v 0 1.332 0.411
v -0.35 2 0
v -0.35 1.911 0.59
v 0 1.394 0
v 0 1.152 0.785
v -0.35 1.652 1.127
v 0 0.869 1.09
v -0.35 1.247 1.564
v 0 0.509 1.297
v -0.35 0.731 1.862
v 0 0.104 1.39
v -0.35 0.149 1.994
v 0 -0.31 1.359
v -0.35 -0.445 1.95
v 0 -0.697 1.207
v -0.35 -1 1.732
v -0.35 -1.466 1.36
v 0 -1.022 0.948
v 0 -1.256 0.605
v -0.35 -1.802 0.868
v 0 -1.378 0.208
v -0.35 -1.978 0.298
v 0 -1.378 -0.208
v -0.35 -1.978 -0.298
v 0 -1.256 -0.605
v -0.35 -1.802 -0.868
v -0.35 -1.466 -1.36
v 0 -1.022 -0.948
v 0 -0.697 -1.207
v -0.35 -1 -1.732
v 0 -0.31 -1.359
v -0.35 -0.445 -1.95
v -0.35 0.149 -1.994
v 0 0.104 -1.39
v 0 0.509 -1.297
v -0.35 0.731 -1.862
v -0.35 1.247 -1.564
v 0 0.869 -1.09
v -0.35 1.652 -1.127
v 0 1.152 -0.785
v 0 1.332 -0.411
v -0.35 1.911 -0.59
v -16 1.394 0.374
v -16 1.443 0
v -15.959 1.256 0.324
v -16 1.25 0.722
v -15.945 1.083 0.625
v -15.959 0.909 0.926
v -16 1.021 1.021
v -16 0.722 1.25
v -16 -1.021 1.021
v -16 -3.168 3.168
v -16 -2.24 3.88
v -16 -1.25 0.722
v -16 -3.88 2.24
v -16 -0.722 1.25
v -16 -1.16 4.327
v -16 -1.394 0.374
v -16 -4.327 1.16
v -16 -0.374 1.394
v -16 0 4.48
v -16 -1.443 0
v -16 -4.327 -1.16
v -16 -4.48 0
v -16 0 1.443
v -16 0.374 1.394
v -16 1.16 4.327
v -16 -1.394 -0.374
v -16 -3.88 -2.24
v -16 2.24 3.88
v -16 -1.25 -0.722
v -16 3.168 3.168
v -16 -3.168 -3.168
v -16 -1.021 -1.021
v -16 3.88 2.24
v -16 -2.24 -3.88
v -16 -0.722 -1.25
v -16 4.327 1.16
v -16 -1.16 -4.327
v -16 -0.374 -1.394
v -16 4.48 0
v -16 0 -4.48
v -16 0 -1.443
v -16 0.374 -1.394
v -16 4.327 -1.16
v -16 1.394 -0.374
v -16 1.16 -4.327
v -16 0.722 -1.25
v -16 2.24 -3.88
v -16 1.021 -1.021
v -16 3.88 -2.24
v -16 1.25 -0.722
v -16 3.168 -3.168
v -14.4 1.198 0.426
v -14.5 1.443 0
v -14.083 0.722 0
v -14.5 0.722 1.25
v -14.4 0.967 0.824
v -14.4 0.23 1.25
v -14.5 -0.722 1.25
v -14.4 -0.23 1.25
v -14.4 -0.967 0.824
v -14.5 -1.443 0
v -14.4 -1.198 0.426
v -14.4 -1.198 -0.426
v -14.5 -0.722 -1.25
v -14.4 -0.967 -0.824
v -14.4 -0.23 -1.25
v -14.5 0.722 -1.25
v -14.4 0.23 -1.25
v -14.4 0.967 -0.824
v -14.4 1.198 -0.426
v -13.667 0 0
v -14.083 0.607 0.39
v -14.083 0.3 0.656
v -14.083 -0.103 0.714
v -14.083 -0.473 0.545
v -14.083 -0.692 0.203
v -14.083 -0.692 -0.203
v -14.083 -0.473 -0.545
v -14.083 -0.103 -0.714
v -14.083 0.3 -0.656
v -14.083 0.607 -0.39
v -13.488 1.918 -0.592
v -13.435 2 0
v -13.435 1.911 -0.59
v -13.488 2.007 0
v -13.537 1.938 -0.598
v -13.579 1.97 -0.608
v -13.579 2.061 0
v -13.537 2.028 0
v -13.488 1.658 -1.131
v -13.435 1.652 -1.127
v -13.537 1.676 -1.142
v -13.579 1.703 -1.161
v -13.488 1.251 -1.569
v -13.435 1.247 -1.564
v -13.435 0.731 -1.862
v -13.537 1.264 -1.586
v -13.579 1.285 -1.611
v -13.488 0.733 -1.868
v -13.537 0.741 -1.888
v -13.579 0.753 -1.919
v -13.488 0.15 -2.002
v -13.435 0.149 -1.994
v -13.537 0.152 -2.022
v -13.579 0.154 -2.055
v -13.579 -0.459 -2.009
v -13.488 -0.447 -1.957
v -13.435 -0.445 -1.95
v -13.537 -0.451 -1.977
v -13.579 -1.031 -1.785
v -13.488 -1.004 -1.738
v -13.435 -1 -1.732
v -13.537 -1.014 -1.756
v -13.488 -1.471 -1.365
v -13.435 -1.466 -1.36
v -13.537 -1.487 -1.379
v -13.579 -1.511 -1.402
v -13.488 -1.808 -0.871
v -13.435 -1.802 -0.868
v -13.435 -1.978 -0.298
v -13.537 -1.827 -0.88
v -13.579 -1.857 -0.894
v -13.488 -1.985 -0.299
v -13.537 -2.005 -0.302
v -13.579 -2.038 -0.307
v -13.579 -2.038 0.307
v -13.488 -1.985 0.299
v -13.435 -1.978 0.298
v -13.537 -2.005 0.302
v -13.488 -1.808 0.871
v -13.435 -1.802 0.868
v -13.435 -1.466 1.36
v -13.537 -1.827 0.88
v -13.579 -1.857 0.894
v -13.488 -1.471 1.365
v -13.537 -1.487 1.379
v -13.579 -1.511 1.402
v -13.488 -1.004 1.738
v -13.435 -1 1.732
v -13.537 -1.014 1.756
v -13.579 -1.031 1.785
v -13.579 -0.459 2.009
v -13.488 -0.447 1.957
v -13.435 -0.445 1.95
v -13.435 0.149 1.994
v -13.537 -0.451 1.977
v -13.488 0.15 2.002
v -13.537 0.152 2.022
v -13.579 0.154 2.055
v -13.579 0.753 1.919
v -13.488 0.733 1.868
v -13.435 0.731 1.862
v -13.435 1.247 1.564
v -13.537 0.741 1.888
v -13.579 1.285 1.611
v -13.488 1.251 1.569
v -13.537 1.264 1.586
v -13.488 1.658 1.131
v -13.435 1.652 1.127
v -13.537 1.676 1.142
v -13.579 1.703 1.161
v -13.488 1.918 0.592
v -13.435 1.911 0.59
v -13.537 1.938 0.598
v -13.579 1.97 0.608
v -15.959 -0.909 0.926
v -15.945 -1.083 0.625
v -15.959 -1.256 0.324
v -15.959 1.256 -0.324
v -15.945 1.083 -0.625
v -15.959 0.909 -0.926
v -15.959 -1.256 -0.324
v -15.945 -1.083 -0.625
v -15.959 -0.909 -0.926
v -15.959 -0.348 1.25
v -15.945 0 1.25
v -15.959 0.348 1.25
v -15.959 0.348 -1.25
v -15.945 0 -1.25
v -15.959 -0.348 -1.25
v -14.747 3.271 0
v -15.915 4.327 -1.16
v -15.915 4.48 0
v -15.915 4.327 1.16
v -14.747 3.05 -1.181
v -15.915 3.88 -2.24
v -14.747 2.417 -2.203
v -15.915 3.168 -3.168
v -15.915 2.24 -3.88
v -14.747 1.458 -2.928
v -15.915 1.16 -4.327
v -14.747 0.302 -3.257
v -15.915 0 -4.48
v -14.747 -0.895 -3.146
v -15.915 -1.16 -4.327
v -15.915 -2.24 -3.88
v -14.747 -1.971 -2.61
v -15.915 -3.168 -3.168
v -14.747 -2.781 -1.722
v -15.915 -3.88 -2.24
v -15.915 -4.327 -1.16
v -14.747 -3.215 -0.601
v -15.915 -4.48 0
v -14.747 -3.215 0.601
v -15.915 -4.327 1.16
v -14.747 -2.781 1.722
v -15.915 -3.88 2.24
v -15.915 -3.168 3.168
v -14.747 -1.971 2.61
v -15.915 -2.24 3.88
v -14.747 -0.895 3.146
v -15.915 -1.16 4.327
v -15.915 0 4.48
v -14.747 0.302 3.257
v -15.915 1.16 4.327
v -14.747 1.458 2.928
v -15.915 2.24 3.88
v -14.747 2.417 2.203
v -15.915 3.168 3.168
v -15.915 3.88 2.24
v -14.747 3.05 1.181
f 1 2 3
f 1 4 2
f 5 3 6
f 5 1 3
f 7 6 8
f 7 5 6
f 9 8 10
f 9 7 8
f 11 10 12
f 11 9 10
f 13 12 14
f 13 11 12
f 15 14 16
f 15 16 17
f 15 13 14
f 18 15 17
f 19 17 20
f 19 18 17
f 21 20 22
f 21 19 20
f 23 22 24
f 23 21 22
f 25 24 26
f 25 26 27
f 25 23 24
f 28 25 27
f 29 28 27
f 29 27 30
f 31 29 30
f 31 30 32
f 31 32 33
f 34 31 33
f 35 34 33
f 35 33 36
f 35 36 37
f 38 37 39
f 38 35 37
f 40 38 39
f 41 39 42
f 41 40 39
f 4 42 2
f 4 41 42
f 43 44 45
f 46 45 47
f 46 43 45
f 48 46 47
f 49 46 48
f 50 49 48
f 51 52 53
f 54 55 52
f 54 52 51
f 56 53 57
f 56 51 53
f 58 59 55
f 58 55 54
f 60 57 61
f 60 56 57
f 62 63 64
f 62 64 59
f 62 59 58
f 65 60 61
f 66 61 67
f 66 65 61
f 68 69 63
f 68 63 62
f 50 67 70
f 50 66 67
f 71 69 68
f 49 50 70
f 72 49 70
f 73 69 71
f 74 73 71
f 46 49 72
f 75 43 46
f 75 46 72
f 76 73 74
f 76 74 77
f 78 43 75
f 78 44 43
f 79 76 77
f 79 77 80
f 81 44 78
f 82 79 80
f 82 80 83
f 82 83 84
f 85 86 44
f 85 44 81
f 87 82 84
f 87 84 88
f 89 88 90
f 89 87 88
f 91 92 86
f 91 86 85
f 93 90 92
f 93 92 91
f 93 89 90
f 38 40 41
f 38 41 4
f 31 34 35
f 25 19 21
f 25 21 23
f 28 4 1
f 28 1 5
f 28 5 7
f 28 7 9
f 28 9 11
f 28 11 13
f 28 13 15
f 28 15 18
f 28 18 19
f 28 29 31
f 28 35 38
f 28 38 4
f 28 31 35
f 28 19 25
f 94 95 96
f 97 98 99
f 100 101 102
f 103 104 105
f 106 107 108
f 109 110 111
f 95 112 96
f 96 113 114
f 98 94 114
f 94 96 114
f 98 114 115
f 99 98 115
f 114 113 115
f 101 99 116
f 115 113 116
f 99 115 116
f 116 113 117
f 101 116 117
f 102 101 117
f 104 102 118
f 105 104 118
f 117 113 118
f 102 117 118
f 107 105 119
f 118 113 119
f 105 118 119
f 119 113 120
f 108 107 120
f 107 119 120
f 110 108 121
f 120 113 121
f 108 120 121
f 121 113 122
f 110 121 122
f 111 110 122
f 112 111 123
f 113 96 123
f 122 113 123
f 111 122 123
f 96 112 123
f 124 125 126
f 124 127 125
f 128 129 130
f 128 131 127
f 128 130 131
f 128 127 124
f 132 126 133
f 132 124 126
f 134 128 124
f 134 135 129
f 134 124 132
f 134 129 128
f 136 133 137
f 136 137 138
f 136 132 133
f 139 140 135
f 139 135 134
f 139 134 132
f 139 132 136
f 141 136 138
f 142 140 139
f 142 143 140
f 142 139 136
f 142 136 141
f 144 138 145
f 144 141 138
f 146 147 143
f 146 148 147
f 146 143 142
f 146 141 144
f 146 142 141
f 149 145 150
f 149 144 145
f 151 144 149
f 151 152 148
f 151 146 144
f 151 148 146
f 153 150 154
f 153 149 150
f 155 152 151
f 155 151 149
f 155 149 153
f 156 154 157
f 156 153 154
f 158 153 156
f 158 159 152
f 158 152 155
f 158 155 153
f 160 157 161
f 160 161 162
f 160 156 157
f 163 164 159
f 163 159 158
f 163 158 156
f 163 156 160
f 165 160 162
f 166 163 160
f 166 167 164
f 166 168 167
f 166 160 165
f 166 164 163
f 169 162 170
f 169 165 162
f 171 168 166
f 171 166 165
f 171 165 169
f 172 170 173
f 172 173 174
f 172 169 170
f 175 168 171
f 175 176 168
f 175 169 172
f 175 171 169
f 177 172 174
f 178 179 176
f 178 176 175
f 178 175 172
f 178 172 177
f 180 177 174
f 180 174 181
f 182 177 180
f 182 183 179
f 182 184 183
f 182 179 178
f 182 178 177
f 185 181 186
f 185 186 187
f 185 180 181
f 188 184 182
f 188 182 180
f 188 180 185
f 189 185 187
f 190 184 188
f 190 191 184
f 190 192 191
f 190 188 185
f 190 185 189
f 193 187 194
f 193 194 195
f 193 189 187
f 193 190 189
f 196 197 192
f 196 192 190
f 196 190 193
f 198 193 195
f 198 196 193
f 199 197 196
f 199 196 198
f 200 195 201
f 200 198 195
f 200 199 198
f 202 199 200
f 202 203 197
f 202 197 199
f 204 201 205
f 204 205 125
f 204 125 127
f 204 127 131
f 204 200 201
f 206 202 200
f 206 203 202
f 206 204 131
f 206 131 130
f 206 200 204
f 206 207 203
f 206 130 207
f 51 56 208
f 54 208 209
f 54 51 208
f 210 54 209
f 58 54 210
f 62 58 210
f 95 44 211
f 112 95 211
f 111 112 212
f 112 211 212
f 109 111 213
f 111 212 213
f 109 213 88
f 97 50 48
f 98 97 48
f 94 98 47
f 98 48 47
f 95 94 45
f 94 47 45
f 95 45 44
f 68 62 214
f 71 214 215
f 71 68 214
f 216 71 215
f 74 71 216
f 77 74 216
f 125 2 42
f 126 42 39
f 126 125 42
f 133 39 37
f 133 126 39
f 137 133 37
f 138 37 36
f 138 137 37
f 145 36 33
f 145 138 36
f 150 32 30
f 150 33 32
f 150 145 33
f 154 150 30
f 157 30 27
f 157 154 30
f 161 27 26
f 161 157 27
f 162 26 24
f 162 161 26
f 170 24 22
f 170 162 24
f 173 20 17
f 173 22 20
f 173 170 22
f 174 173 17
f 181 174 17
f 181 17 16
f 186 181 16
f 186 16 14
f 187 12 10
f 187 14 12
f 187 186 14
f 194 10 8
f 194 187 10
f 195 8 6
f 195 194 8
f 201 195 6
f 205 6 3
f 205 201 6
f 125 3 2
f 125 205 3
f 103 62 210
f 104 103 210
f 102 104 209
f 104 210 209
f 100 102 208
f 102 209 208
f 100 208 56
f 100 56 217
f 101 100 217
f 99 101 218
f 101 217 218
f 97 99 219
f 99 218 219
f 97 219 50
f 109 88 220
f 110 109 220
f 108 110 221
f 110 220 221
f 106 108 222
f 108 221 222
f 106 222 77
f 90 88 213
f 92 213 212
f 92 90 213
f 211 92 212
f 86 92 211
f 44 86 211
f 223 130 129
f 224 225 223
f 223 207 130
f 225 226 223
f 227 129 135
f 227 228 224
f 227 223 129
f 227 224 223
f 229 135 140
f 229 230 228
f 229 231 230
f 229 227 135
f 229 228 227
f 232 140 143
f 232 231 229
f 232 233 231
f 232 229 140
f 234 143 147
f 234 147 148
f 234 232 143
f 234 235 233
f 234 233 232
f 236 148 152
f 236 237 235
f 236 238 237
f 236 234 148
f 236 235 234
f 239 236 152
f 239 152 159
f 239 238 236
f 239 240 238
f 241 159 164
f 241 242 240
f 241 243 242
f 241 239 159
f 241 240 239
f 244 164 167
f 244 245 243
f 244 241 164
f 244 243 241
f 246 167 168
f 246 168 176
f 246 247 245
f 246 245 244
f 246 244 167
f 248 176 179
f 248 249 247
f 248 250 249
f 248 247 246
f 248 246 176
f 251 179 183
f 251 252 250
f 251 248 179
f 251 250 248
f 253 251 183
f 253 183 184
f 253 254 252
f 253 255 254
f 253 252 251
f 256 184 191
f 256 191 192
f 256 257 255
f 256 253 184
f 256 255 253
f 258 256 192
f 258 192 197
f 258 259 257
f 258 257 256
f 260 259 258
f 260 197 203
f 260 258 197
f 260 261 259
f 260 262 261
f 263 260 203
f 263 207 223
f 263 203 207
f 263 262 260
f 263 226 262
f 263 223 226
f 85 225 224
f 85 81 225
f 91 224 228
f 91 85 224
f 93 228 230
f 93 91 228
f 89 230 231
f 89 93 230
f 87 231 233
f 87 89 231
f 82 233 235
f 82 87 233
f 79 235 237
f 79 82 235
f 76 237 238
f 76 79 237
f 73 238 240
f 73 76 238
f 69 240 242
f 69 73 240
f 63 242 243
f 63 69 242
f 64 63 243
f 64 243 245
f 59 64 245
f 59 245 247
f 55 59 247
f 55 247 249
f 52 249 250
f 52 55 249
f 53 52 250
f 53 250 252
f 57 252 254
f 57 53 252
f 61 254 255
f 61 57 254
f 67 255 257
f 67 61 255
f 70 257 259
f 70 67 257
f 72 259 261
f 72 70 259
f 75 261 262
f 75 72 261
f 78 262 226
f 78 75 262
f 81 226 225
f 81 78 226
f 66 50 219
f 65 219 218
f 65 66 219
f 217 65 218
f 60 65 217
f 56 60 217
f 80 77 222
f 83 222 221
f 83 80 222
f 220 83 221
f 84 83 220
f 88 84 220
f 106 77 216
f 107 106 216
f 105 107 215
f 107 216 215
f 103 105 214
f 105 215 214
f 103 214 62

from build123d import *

# Parameters (mm, degrees)
CUT_EXTRUDE_1_DEPTH = 2.58


with BuildPart() as part:
    # Sketch 1 → Revolve 1 (revolve)
    with BuildSketch(Plane.XY):
        with BuildLine():
            Line((0, 2), (-13.435105037, 2))
            ThreePointArc((-13.435105037, 2), (-13.513251262, 2.015899029), (-13.578972997, 2.061068326))
            Line((-13.578972997, 2.061068326), (-15.914908162, 4.48))
            Line((-15.914908162, 4.48), (-16, 4.48))
            Line((-16, 4.48), (-16, 0))
            Line((-16, 0), (0, 0))
            Line((0, 0), (0, 2))
        make_face()
    revolve(axis=Axis((0, 0, 0), (-1, 0, 0)))

    # Sketch 2 → Cut-Extrude 1 (cut)
    with BuildSketch(Plane.ZY.offset(16)):
        Polygon((0, 1.443375673), (-1.25, 0.721687836), (-1.25, -0.721687836), (0, -1.443375673), (1.25, -0.721687836), (1.25, 0.721687836), align=None)
    extrude(amount=-CUT_EXTRUDE_1_DEPTH, mode=Mode.SUBTRACT)

    # Sketch 6 → Revolve 2 (revolve)
    with BuildSketch(Plane.XY):
        Polygon((-14.5, 1.443375673), (-13.666666667, 0), (-13.05, 0), (-13.05, 1.443375673), align=None)
    revolve(axis=Axis((-16, 0, 0), (1, 0, 0)))

    # Sketch 7 → Cut-Revolve 2 (revolve, cut)
    with BuildSketch(Plane.XY):
        Polygon((-16, 1.443375673), (-16, 0), (-15.593, 0), align=None)
    revolve(axis=Axis((-16, 0, 0), (1, 0, 0)), mode=Mode.SUBTRACT)

    # Sketch 4 → Cut-Revolve 1 (revolve, cut)
    with BuildSketch(Plane.XY):
        Polygon((-0.35, 2), (0, 1.393782217), (0.35, 2), align=None)
    revolve(axis=Axis((-0.35, 0, 0), (1, 0, 0)), mode=Mode.SUBTRACT)


solid = part.part
